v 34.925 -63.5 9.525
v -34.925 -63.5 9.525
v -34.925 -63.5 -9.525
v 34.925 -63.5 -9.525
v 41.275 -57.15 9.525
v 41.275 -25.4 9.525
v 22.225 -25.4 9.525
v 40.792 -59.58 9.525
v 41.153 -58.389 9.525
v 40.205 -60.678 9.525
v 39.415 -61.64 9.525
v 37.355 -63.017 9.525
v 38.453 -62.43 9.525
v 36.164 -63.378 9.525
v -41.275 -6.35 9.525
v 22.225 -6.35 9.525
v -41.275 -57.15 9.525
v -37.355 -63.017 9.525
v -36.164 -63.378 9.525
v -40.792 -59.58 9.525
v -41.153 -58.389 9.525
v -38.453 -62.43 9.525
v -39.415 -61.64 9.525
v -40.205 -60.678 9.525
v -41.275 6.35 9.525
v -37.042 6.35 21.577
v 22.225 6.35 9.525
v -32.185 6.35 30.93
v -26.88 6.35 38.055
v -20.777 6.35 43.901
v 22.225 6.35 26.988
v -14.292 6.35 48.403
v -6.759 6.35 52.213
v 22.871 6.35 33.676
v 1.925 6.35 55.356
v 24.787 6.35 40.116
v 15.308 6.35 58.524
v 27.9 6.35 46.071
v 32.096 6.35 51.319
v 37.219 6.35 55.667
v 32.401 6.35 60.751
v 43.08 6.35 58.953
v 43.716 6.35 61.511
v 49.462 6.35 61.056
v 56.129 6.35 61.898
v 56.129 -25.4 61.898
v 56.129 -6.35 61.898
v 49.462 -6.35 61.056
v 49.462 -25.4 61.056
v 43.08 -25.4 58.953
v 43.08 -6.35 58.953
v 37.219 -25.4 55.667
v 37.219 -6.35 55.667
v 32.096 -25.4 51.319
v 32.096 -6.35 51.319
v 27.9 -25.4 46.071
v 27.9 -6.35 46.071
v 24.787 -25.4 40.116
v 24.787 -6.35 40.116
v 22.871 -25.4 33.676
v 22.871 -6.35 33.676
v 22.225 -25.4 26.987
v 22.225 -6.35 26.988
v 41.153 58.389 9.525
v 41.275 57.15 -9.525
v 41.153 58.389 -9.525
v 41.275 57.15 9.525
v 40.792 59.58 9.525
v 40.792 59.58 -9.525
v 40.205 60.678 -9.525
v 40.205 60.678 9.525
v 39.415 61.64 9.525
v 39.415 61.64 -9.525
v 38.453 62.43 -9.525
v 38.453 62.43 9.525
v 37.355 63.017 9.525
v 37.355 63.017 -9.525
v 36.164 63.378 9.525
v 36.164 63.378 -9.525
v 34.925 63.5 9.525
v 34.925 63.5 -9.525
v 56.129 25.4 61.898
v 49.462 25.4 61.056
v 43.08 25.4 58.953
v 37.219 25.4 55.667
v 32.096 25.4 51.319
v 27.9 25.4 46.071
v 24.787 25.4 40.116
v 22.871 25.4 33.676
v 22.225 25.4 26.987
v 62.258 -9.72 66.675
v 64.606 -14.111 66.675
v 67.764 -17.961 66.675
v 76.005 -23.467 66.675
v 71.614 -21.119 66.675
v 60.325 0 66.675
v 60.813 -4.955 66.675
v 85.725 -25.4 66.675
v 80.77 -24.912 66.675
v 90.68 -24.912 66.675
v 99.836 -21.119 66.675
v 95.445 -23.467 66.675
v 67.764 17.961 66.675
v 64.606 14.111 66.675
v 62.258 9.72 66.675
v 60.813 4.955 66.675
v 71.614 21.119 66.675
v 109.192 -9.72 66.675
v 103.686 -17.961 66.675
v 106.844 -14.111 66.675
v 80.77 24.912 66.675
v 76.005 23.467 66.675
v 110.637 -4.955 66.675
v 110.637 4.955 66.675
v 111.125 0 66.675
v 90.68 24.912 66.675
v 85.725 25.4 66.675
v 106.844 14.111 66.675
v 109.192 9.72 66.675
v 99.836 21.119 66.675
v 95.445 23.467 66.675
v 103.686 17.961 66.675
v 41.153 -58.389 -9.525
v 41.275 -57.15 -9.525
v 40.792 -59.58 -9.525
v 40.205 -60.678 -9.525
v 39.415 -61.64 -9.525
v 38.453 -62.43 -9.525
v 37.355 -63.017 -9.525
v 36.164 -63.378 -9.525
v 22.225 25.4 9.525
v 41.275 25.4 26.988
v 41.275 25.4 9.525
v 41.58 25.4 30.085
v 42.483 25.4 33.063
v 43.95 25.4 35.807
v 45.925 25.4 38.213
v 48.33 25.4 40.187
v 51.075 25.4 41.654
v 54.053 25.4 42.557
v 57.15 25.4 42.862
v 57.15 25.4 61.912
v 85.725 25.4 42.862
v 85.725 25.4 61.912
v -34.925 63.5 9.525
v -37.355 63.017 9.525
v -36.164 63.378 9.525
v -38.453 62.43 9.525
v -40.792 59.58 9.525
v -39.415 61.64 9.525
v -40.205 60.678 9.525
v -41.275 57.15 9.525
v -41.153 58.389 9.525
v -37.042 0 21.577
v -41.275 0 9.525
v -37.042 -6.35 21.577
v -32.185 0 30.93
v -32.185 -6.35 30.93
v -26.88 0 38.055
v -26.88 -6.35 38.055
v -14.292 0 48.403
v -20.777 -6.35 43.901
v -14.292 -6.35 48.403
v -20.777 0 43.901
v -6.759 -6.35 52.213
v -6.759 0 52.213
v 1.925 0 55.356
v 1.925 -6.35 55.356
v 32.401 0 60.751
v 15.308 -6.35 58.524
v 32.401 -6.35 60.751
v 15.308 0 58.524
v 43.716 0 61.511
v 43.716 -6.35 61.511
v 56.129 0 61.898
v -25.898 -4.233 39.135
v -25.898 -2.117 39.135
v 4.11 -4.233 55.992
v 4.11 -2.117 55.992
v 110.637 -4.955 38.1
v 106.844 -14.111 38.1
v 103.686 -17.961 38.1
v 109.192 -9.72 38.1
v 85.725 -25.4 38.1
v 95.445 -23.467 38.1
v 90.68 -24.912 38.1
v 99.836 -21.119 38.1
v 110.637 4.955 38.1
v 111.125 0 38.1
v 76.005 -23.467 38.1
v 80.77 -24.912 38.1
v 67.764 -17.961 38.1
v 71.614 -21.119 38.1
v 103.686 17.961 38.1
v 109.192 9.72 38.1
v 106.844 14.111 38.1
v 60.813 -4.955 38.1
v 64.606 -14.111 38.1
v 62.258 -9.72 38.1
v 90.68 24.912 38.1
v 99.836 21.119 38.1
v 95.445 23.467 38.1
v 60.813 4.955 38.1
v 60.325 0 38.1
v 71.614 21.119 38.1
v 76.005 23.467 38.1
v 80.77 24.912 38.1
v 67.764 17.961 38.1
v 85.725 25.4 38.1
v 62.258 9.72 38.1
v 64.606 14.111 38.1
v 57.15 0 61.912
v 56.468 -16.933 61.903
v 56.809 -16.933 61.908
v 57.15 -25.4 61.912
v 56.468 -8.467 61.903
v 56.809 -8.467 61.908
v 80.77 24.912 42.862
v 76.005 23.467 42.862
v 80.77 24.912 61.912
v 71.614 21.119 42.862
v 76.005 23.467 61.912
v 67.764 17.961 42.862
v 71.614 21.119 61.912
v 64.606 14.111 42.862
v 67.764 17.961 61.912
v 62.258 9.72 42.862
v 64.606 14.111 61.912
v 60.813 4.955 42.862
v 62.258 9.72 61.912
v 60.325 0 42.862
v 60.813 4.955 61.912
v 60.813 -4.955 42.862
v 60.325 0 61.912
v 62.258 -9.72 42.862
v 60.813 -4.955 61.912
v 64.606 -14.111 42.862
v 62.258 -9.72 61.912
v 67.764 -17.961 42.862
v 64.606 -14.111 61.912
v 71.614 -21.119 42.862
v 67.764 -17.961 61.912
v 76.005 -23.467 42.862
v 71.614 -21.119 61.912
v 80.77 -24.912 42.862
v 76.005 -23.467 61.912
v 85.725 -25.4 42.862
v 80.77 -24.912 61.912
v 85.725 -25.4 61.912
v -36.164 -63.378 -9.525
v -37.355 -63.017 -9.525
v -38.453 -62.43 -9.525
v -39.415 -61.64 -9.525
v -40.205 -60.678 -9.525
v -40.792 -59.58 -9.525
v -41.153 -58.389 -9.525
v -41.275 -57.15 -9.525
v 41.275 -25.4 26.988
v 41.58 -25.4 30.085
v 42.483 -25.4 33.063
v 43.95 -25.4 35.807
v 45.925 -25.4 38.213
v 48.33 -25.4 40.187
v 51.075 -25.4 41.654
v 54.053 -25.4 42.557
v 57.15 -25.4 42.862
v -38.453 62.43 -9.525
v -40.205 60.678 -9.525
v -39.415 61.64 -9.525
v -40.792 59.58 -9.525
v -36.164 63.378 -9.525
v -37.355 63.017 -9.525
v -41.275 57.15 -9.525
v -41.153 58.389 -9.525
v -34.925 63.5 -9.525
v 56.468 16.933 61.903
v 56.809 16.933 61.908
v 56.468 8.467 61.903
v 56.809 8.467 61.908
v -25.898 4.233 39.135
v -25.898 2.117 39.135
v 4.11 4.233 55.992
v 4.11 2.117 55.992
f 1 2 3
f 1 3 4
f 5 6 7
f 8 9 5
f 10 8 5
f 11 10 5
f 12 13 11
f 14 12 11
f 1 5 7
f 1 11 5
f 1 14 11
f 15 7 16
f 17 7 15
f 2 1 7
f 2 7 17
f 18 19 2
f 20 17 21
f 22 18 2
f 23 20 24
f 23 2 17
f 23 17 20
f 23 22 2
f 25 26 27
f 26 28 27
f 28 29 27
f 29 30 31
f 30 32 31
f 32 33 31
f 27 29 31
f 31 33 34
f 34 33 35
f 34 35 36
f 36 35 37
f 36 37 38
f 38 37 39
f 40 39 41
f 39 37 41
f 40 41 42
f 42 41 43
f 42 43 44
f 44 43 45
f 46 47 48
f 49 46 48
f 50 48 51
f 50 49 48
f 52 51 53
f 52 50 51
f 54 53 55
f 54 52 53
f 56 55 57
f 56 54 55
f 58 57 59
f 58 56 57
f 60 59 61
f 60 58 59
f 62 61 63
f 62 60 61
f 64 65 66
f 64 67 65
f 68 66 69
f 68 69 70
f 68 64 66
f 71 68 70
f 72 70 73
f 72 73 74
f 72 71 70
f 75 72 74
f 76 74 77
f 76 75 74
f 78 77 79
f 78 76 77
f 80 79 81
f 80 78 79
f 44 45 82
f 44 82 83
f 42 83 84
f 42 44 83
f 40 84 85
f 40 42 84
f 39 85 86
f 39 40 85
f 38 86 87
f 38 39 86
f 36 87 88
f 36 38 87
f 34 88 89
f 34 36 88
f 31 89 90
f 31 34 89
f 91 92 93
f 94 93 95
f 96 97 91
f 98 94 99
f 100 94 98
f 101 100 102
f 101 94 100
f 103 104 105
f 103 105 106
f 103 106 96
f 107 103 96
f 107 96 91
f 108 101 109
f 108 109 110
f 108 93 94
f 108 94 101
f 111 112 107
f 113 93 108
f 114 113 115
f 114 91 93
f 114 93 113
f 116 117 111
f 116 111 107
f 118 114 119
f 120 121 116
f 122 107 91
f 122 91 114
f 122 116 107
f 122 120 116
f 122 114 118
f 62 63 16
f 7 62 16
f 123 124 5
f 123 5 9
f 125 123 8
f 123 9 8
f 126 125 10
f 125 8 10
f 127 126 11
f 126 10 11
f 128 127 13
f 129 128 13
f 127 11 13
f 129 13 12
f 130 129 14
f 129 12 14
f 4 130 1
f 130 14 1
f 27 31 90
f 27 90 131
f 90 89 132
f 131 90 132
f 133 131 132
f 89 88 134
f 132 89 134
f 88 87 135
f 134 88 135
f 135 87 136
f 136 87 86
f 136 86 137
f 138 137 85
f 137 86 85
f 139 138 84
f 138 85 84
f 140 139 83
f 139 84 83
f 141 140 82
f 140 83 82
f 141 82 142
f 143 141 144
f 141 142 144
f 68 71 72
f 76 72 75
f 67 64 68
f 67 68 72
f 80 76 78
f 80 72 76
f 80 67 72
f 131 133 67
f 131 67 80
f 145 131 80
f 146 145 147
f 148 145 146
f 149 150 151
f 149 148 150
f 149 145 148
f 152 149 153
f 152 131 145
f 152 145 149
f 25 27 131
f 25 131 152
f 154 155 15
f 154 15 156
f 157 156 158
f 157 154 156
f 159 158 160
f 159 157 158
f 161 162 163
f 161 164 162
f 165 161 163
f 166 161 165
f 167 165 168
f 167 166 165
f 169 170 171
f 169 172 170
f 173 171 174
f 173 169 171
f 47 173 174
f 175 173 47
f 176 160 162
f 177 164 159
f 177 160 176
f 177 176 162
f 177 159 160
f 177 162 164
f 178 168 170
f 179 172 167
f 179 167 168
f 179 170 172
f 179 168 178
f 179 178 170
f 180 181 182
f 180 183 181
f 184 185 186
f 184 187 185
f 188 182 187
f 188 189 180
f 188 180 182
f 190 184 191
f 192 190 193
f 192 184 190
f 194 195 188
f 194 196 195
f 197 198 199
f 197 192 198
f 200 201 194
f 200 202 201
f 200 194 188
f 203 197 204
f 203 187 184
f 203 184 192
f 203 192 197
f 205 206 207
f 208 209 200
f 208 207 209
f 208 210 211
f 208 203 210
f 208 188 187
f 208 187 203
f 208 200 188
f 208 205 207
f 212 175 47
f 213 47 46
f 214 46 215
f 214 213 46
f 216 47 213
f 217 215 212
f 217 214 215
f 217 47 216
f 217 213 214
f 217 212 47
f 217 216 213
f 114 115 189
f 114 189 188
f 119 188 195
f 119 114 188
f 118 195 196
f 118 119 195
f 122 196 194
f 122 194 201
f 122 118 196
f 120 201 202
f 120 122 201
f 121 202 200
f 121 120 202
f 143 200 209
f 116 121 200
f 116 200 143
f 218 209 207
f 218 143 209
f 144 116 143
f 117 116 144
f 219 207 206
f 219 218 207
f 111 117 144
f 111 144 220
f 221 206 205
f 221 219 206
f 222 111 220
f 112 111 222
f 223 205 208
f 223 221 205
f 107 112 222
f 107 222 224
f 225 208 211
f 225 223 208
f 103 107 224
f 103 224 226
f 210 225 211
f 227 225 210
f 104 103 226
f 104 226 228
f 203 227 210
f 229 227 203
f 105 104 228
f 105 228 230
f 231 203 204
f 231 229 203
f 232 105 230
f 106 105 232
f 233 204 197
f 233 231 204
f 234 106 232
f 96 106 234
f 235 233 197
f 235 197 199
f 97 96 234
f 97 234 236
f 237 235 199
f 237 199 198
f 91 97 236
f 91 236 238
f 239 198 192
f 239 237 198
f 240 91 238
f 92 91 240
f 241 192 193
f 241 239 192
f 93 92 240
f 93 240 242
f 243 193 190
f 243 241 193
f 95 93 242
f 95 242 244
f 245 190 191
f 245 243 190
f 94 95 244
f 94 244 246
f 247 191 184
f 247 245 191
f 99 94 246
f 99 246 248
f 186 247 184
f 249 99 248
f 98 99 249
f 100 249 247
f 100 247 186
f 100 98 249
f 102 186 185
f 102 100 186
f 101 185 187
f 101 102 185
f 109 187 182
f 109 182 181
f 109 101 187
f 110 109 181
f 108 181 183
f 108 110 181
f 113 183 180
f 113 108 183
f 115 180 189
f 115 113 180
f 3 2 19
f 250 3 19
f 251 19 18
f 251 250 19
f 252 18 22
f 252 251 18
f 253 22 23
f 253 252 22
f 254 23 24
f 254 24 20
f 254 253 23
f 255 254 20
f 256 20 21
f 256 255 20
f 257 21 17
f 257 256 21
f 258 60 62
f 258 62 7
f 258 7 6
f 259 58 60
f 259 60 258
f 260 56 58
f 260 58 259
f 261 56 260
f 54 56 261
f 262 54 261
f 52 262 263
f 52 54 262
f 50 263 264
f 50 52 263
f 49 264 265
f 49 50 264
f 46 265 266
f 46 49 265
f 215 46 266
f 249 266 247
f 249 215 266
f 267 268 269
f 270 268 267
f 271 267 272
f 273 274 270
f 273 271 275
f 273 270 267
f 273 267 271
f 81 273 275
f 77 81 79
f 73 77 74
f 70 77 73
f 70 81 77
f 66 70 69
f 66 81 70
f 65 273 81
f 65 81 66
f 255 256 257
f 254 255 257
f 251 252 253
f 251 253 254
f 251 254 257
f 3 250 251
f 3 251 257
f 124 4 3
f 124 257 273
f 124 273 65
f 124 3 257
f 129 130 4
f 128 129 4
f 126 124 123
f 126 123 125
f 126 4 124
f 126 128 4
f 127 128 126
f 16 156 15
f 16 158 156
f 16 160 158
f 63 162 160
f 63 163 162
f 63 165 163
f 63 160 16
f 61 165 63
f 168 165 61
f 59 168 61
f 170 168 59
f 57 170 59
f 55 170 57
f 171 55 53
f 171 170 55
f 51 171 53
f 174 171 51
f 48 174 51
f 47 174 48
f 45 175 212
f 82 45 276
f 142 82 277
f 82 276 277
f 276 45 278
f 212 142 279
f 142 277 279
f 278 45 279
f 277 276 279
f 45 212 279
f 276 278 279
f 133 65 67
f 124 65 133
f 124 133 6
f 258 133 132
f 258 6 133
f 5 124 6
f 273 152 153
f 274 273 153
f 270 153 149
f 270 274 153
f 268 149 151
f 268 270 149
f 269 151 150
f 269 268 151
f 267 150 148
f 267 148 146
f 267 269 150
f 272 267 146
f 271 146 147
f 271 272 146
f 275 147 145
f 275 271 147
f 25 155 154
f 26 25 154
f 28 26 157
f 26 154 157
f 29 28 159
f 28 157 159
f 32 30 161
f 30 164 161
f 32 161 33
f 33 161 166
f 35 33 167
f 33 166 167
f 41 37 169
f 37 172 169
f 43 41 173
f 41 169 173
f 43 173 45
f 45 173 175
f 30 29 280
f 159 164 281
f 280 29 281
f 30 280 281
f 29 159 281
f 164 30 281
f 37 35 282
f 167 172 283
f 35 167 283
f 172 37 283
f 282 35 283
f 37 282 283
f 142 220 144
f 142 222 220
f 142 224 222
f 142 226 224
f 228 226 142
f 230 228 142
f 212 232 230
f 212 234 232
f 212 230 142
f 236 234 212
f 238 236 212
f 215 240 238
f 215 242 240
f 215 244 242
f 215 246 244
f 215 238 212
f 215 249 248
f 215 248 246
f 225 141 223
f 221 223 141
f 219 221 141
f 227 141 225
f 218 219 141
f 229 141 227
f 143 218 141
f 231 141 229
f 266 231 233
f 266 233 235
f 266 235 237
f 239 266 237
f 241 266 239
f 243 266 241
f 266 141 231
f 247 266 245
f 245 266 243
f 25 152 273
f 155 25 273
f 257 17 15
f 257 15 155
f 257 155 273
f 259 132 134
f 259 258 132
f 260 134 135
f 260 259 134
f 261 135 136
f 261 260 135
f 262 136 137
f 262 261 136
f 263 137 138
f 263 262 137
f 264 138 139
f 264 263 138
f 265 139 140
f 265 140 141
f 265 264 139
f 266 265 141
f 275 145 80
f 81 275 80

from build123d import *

# Parameters (mm, degrees)
F1_DEPTH = 63.5
F2_DEPTH = 25.4
F3_DEPTH = 6.35
F5_R     = 6.35


with BuildPart() as f1:
    # F0 (on Front) → F1 (new body, symmetric)
    with BuildSketch(Plane.XZ):
        Polygon((41.275, -9.525), (41.275, 9.525), (22.225, 9.525), (-41.275, 9.525), (-41.275, -9.525), align=None)
    extrude(amount=F1_DEPTH, both=True)

    # F0 (on Front) → F2 (join, symmetric)
    with BuildSketch(Plane.XZ):
        Polygon((60.325, 61.9125), (60.325, 42.8625), (85.725, 42.8625), (85.725, 52.3875), (85.725, 61.9125), align=None)
        with BuildLine():
            Line((22.225, 9.525), (41.275, 9.525))
            Line((41.275, 9.525), (41.275, 26.9875))
            ThreePointArc((41.275, 26.9875), (45.92468, 38.21282), (57.15, 42.8625))
            Line((57.15, 42.8625), (60.325, 42.8625))
            Line((60.325, 42.8625), (60.325, 61.9125))
            Line((60.325, 61.9125), (57.15, 61.9125))
            add(Edge.make_bspline(
                [(56.128748, 61.897565), (56.46798, 61.902911), (56.808396, 61.907889), (57.15, 61.9125)],
                knots=[110.923942, 110.923942, 110.923942, 110.923942, 111.498569, 111.498569, 111.498569, 111.498569], degree=3))
            ThreePointArc((56.128748, 61.897565), (32.09583, 51.319458), (22.225, 26.9875))
            Line((22.225, 26.9875), (22.225, 9.525))
        make_face()
    extrude(amount=F2_DEPTH, both=True)

    # F0 (on Front) → F3 (join, symmetric)
    with BuildSketch(Plane.XZ):
        with BuildLine():
            Line((-41.275, 9.525), (22.225, 9.525))
            Line((22.225, 9.525), (22.225, 26.9875))
            ThreePointArc((22.225, 26.9875), (32.09583, 51.319458), (56.128748, 61.897565))
            add(Edge.make_bspline(
                [(-41.275, 9.525), (-30.753714, 46.112992), (-9.355641, 60.865587), (56.128748, 61.897565)],
                knots=[0, 0, 0, 0, 110.923942, 110.923942, 110.923942, 110.923942], degree=3))
        make_face()
    extrude(amount=F3_DEPTH, both=True)

    # F0 (on Front) → F4 (revolve)
    with BuildSketch(Plane.XZ):
        Polygon((85.725, 52.3875), (85.725, 42.8625), (85.725, 38.1), (111.125, 38.1), (111.125, 66.675), (85.725, 66.675), (85.725, 61.9125), align=None)
    revolve(axis=Axis((85.725, 0, 59.53125), (0, 0, 1)))

    # F5
    f5_edges = [f1.edges().sort_by_distance(p)[0] for p in [
        (41.275, -63.5, 0),
        (-41.275, -63.5, 0),
        (41.275, 63.5, 0),
        (-41.275, 63.5, 0),
    ]]
    fillet(f5_edges, radius=F5_R)


solid = f1.part
